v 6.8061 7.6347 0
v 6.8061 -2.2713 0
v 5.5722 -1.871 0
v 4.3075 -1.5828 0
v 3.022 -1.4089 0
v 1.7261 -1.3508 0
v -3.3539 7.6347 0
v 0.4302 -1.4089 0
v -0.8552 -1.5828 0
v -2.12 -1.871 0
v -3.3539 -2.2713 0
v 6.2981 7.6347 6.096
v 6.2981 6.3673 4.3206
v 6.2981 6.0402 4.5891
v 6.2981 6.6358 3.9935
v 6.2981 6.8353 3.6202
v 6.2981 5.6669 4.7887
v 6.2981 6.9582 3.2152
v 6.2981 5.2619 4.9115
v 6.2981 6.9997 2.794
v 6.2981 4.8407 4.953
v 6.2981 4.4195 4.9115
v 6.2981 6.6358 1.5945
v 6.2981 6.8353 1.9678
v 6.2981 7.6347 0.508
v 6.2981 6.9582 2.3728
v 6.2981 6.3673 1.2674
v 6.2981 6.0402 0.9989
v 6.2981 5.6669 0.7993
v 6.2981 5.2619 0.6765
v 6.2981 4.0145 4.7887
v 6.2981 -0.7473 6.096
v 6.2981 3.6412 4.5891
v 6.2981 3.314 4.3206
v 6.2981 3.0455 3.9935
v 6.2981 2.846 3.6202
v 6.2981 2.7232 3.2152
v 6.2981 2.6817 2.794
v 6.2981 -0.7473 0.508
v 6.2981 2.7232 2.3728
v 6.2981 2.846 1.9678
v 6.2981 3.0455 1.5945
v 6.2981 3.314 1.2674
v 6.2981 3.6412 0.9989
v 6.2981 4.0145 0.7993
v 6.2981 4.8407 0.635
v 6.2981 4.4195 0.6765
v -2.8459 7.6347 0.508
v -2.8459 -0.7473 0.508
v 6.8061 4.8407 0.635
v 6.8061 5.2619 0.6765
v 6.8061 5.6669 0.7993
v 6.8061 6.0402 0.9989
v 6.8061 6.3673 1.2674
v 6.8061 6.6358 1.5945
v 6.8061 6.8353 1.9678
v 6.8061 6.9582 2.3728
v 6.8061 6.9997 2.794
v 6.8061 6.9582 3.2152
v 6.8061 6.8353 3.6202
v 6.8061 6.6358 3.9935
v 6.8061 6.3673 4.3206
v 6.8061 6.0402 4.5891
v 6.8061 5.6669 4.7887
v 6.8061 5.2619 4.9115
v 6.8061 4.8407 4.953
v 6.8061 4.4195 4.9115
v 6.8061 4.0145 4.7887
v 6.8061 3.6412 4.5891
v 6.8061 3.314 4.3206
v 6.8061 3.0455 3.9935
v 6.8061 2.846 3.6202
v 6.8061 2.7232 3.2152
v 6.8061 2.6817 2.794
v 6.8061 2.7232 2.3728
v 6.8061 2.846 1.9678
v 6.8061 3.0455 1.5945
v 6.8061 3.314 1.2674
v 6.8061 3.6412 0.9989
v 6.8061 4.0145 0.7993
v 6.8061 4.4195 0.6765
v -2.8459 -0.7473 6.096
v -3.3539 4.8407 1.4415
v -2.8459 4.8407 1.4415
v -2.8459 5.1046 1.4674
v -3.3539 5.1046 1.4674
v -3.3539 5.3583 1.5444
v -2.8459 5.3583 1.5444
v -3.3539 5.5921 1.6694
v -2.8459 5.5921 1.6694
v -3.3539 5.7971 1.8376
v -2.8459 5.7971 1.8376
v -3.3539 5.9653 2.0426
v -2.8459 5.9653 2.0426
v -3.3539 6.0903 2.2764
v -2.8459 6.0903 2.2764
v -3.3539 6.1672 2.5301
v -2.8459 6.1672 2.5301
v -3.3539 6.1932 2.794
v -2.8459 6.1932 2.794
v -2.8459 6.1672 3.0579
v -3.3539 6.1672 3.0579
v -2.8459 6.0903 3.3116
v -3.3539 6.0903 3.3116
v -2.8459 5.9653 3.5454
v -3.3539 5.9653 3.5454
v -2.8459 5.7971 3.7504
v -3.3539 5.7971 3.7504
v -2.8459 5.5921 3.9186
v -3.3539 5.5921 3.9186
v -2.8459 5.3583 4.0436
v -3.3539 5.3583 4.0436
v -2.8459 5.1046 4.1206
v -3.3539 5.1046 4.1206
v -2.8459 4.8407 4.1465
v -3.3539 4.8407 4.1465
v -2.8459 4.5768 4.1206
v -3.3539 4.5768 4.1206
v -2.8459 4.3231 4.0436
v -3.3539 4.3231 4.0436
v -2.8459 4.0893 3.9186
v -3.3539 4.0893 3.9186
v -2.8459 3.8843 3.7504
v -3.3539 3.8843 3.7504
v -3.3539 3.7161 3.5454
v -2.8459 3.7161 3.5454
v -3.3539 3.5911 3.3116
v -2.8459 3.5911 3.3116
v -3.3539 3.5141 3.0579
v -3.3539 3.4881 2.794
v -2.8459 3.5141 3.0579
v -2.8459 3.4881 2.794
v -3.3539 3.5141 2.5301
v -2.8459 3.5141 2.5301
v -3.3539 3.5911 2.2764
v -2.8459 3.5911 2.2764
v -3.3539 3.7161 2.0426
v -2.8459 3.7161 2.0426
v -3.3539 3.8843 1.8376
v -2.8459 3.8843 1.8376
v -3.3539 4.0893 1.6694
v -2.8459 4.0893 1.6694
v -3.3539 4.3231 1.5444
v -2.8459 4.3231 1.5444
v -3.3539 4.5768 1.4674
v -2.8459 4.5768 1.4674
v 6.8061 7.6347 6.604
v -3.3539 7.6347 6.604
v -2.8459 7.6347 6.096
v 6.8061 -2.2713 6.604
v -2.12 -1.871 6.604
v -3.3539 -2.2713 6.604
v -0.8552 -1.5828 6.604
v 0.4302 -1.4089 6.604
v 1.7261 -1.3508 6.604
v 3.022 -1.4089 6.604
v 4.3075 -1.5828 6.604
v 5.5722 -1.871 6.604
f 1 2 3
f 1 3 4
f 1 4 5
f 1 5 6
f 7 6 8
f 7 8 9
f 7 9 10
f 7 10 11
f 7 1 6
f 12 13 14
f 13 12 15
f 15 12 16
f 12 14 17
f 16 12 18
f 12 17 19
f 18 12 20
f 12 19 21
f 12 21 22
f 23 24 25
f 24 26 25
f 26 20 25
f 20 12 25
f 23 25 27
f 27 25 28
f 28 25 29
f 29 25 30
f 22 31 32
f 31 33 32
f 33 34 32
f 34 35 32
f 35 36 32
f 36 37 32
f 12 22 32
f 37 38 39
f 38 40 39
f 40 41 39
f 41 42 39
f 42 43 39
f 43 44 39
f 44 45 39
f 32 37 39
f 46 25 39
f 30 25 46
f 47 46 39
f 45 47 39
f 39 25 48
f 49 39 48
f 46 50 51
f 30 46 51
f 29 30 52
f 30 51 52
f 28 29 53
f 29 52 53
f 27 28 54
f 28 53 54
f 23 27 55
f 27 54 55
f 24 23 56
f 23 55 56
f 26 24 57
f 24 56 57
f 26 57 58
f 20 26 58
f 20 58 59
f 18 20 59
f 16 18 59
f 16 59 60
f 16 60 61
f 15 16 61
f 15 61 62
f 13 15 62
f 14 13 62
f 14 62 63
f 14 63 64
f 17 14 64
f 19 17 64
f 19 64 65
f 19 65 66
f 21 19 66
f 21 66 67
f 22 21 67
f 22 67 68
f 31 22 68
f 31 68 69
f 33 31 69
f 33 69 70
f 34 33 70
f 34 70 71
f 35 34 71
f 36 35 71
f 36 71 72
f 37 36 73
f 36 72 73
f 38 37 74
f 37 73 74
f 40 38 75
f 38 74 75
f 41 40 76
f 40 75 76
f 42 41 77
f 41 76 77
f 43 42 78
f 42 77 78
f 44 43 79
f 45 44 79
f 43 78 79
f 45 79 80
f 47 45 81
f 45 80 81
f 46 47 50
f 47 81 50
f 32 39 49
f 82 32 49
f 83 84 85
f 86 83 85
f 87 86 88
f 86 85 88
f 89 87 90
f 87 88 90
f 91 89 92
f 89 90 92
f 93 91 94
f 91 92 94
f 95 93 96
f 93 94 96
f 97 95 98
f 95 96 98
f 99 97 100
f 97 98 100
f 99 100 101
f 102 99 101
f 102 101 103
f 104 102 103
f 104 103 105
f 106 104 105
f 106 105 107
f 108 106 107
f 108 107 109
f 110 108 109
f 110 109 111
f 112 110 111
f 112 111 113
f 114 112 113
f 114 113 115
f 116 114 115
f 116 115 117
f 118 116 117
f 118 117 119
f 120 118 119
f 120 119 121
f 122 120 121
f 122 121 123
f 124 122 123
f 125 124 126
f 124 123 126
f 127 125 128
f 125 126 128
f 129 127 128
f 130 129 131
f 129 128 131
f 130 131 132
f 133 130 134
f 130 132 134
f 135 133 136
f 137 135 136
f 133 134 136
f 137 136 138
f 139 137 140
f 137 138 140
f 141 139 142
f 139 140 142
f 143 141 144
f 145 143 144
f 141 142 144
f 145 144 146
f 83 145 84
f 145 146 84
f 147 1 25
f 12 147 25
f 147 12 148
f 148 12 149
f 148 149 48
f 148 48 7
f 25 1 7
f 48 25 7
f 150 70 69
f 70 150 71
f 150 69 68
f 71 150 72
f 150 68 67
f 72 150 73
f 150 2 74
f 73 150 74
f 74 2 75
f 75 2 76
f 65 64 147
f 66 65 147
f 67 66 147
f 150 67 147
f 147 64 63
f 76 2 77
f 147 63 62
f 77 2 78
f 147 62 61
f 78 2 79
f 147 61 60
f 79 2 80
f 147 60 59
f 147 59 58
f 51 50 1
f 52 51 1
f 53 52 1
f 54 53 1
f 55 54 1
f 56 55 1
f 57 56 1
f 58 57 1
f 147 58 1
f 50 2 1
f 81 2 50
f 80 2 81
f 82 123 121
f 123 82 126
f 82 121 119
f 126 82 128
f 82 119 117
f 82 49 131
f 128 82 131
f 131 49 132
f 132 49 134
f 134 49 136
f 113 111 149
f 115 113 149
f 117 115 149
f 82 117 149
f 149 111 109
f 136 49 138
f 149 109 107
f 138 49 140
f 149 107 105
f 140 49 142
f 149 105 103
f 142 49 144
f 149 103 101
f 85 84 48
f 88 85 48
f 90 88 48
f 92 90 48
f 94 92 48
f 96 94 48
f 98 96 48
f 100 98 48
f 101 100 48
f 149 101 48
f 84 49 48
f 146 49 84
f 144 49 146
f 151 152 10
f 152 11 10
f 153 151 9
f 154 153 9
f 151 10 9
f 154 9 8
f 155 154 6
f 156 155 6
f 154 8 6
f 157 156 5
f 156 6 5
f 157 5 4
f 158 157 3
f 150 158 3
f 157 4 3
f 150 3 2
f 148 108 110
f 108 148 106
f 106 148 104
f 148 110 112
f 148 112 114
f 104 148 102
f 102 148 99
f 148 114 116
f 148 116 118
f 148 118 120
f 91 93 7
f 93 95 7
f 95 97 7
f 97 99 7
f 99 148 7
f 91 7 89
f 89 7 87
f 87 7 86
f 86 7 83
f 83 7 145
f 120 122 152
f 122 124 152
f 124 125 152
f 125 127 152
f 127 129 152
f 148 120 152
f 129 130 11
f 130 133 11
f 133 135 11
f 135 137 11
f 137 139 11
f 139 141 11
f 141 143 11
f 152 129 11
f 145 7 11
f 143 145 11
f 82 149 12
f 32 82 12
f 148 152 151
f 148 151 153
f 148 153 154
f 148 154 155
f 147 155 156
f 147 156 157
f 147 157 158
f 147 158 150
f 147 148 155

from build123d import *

# Parameters (mm, degrees)
BOSS_EXTRUDE1_DEPTH       = 5.588
F_6_32_TAPPED_HOLE1_D     = 2.7051
F_6_32_TAPPED_HOLE1_DEPTH = 0.508
CUT_EXTRUDE1_REACH        = 12.16
SKETCH6_R                 = 2.159
CUT_EXTRUDE2_DEPTH        = 6.588
BOSS_EXTRUDE3_DEPTH       = 1.016
SKETCH20_W                = 9.144
SKETCH20_H                = 2.56692539
CUT_EXTRUDE3_DEPTH        = 8.382
SKETCH22_W                = 9.144
SKETCH22_H                = 8.382
BOSS_EXTRUDE4_DEPTH       = 0.508
SKETCH24_W                = 9.144
SKETCH24_H                = 8.382
BOSS_EXTRUDE5_DEPTH       = 0.508


with BuildPart() as part:
    # Sketch1 → Boss-Extrude1 (new body)
    with BuildSketch(Plane.XY):
        Polygon((-3.353873239, 7.634688699), (-3.353873239, -2.271311301), (6.806126761, -2.271311301), (6.806126761, 7.634688699), (6.298126761, 7.634688699), (6.298126761, -0.747311301), (-2.845873239, -0.747311301), (-2.845873239, 7.634688699), align=None)
    extrude(amount=BOSS_EXTRUDE1_DEPTH)

    # #6-32 Tapped Hole1
    with Locations(Plane.ZY.offset(3.353873239)):
        with Locations((2.794, 4.840688699)):
            Hole(F_6_32_TAPPED_HOLE1_D / 2, depth=F_6_32_TAPPED_HOLE1_DEPTH)

    # Sketch6 → Cut-Extrude1 (cut, up to next)
    with BuildSketch(Plane(origin=(6.806126761, 0, 0), x_dir=(0, 0, -1), z_dir=(1, 0, 0)), mode=Mode.PRIVATE) as cut_extrude1_sk1:
        with Locations((-2.794, 4.840688699)):
            Circle(SKETCH6_R)
    cut_extrude1_tool1 = extrude(cut_extrude1_sk1.sketch, amount=-CUT_EXTRUDE1_REACH, mode=Mode.PRIVATE) & part.part
    add(cut_extrude1_tool1.solids().sort_by_distance((6.806127, 4.840689, 2.794))[0], mode=Mode.SUBTRACT)

    # Sketch16 → Cut-Extrude2 (cut, through all)
    with BuildSketch(Plane(origin=(0, 0, 0), x_dir=(-1, 0, 0), z_dir=(0, 0, -1))):
        with BuildLine():
            Line((3.353873239, -2.271311301), (-6.806126761, -2.271311301))
            ThreePointArc((-6.806126761, -2.271311301), (-1.726126761, -1.350821544), (3.353873239, -2.271311301))
        make_face()
    extrude(amount=-CUT_EXTRUDE2_DEPTH, mode=Mode.SUBTRACT)

    # Sketch19 → Boss-Extrude3 (add)
    with BuildSketch(Plane.XY.offset(5.588)):
        with BuildLine():
            Line((6.806126761, 7.634688699), (6.298126761, 7.634688699))
            Line((6.298126761, 7.634688699), (-2.845873239, 7.634688699))
            Line((-2.845873239, 7.634688699), (-3.353873239, 7.634688699))
            Line((-3.353873239, 7.634688699), (-3.353873239, -2.271311301))
            ThreePointArc((-3.353873239, -2.271311301), (1.726126761, -1.350821544), (6.806126761, -2.271311301))
            Line((6.806126761, -2.271311301), (6.806126761, 7.634688699))
        make_face()
    extrude(amount=BOSS_EXTRUDE3_DEPTH)

    # Sketch20 → Cut-Extrude3 (cut)
    with BuildSketch(Plane(origin=(0, 7.634688699, 0), x_dir=(1, 0, 0), z_dir=(0, 1, 0))):
        with Locations((1.726126761, -6.871462695)):
            Rectangle(SKETCH20_W, SKETCH20_H)
    extrude(amount=-CUT_EXTRUDE3_DEPTH, mode=Mode.SUBTRACT)

    # Sketch22 → Boss-Extrude4 (add)
    with BuildSketch(Plane.XY.offset(6.604)):
        with Locations((1.726126761, 3.443688699)):
            Rectangle(SKETCH22_W, SKETCH22_H)
    extrude(amount=-BOSS_EXTRUDE4_DEPTH)

    # Sketch24 → Boss-Extrude5 (add)
    with BuildSketch(Plane(origin=(0, 0, 0), x_dir=(-1, 0, 0), z_dir=(0, 0, -1))):
        with Locations((-1.726126761, 3.443688699)):
            Rectangle(SKETCH24_W, SKETCH24_H)
    extrude(amount=-BOSS_EXTRUDE5_DEPTH)


solid = part.part
